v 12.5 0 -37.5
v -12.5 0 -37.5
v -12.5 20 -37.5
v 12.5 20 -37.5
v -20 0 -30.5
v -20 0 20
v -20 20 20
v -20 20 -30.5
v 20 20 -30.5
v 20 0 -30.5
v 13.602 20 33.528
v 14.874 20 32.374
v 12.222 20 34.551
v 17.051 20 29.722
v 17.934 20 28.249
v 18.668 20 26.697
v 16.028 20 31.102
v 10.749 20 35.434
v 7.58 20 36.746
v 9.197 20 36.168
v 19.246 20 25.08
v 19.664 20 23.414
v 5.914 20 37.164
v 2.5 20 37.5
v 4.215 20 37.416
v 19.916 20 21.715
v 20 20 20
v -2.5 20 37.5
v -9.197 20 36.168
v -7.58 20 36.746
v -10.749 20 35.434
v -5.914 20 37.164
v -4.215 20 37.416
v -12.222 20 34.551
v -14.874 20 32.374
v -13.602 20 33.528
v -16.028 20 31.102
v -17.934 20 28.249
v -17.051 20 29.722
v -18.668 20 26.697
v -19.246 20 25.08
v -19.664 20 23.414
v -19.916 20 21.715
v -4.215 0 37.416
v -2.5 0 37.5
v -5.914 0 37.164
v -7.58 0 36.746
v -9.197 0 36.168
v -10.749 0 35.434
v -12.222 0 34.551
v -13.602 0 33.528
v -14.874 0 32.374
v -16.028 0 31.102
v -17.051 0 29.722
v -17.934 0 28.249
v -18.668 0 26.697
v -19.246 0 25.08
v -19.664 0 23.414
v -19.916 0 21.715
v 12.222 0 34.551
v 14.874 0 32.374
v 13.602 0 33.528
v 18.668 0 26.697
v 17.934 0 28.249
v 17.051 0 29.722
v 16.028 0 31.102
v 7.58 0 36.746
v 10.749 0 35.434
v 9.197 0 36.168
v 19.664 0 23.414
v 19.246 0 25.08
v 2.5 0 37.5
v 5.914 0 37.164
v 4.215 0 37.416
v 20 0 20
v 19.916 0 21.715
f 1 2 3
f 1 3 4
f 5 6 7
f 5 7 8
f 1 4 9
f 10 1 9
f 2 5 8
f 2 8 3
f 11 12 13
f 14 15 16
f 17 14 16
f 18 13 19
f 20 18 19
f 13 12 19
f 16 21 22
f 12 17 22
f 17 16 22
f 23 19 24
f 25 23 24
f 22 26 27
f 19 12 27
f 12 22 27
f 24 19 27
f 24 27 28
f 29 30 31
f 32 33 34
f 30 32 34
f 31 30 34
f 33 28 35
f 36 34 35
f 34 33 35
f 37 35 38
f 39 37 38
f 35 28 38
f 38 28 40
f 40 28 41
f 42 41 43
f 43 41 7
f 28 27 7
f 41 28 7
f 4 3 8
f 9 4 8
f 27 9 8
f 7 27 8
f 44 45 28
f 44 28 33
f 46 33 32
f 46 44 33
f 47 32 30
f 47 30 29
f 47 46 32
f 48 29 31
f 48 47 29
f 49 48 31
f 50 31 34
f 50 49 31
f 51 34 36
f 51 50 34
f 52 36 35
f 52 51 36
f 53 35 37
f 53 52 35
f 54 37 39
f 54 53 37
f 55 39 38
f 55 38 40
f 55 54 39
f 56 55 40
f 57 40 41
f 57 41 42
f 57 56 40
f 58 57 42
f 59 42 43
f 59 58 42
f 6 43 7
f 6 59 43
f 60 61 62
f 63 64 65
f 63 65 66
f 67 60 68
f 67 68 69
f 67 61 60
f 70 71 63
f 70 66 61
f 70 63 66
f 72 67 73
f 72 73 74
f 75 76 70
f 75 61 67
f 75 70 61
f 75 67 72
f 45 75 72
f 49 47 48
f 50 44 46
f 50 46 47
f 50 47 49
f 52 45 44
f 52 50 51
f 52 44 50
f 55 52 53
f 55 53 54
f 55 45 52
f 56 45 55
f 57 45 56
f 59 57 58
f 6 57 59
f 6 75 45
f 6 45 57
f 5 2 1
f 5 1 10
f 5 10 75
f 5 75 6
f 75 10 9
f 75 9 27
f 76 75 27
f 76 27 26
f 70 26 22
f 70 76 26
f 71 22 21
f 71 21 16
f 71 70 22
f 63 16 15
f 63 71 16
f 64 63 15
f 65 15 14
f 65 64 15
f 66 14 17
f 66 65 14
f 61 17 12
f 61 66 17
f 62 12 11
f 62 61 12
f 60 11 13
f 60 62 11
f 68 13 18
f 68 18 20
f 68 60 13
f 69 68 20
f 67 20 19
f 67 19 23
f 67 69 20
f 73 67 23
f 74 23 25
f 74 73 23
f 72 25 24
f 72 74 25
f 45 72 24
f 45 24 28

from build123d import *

# Parameters (mm, degrees)
BOSS_EXTRUDE2_DEPTH = 20


with BuildPart() as part:
    # Sketch1 → Boss-Extrude2 (new body)
    with BuildSketch(Plane(origin=(0, 0, 0), x_dir=(1, 0, 0), z_dir=(0, 1, 0))):
        with BuildLine():
            Line((-12.5, 37.5), (12.5, 37.5))
            Line((12.5, 37.5), (20, 30.5))
            Line((20, 30.5), (20, -20))
            ThreePointArc((20, -20), (14.874368671, -32.374368671), (2.5, -37.5))
            Line((2.5, -37.5), (-2.5, -37.5))
            ThreePointArc((-2.5, -37.5), (-14.874368671, -32.374368671), (-20, -20))
            Line((-20, -20), (-20, 30.5))
            Line((-20, 30.5), (-12.5, 37.5))
        make_face()
    extrude(amount=BOSS_EXTRUDE2_DEPTH)


solid = part.part
